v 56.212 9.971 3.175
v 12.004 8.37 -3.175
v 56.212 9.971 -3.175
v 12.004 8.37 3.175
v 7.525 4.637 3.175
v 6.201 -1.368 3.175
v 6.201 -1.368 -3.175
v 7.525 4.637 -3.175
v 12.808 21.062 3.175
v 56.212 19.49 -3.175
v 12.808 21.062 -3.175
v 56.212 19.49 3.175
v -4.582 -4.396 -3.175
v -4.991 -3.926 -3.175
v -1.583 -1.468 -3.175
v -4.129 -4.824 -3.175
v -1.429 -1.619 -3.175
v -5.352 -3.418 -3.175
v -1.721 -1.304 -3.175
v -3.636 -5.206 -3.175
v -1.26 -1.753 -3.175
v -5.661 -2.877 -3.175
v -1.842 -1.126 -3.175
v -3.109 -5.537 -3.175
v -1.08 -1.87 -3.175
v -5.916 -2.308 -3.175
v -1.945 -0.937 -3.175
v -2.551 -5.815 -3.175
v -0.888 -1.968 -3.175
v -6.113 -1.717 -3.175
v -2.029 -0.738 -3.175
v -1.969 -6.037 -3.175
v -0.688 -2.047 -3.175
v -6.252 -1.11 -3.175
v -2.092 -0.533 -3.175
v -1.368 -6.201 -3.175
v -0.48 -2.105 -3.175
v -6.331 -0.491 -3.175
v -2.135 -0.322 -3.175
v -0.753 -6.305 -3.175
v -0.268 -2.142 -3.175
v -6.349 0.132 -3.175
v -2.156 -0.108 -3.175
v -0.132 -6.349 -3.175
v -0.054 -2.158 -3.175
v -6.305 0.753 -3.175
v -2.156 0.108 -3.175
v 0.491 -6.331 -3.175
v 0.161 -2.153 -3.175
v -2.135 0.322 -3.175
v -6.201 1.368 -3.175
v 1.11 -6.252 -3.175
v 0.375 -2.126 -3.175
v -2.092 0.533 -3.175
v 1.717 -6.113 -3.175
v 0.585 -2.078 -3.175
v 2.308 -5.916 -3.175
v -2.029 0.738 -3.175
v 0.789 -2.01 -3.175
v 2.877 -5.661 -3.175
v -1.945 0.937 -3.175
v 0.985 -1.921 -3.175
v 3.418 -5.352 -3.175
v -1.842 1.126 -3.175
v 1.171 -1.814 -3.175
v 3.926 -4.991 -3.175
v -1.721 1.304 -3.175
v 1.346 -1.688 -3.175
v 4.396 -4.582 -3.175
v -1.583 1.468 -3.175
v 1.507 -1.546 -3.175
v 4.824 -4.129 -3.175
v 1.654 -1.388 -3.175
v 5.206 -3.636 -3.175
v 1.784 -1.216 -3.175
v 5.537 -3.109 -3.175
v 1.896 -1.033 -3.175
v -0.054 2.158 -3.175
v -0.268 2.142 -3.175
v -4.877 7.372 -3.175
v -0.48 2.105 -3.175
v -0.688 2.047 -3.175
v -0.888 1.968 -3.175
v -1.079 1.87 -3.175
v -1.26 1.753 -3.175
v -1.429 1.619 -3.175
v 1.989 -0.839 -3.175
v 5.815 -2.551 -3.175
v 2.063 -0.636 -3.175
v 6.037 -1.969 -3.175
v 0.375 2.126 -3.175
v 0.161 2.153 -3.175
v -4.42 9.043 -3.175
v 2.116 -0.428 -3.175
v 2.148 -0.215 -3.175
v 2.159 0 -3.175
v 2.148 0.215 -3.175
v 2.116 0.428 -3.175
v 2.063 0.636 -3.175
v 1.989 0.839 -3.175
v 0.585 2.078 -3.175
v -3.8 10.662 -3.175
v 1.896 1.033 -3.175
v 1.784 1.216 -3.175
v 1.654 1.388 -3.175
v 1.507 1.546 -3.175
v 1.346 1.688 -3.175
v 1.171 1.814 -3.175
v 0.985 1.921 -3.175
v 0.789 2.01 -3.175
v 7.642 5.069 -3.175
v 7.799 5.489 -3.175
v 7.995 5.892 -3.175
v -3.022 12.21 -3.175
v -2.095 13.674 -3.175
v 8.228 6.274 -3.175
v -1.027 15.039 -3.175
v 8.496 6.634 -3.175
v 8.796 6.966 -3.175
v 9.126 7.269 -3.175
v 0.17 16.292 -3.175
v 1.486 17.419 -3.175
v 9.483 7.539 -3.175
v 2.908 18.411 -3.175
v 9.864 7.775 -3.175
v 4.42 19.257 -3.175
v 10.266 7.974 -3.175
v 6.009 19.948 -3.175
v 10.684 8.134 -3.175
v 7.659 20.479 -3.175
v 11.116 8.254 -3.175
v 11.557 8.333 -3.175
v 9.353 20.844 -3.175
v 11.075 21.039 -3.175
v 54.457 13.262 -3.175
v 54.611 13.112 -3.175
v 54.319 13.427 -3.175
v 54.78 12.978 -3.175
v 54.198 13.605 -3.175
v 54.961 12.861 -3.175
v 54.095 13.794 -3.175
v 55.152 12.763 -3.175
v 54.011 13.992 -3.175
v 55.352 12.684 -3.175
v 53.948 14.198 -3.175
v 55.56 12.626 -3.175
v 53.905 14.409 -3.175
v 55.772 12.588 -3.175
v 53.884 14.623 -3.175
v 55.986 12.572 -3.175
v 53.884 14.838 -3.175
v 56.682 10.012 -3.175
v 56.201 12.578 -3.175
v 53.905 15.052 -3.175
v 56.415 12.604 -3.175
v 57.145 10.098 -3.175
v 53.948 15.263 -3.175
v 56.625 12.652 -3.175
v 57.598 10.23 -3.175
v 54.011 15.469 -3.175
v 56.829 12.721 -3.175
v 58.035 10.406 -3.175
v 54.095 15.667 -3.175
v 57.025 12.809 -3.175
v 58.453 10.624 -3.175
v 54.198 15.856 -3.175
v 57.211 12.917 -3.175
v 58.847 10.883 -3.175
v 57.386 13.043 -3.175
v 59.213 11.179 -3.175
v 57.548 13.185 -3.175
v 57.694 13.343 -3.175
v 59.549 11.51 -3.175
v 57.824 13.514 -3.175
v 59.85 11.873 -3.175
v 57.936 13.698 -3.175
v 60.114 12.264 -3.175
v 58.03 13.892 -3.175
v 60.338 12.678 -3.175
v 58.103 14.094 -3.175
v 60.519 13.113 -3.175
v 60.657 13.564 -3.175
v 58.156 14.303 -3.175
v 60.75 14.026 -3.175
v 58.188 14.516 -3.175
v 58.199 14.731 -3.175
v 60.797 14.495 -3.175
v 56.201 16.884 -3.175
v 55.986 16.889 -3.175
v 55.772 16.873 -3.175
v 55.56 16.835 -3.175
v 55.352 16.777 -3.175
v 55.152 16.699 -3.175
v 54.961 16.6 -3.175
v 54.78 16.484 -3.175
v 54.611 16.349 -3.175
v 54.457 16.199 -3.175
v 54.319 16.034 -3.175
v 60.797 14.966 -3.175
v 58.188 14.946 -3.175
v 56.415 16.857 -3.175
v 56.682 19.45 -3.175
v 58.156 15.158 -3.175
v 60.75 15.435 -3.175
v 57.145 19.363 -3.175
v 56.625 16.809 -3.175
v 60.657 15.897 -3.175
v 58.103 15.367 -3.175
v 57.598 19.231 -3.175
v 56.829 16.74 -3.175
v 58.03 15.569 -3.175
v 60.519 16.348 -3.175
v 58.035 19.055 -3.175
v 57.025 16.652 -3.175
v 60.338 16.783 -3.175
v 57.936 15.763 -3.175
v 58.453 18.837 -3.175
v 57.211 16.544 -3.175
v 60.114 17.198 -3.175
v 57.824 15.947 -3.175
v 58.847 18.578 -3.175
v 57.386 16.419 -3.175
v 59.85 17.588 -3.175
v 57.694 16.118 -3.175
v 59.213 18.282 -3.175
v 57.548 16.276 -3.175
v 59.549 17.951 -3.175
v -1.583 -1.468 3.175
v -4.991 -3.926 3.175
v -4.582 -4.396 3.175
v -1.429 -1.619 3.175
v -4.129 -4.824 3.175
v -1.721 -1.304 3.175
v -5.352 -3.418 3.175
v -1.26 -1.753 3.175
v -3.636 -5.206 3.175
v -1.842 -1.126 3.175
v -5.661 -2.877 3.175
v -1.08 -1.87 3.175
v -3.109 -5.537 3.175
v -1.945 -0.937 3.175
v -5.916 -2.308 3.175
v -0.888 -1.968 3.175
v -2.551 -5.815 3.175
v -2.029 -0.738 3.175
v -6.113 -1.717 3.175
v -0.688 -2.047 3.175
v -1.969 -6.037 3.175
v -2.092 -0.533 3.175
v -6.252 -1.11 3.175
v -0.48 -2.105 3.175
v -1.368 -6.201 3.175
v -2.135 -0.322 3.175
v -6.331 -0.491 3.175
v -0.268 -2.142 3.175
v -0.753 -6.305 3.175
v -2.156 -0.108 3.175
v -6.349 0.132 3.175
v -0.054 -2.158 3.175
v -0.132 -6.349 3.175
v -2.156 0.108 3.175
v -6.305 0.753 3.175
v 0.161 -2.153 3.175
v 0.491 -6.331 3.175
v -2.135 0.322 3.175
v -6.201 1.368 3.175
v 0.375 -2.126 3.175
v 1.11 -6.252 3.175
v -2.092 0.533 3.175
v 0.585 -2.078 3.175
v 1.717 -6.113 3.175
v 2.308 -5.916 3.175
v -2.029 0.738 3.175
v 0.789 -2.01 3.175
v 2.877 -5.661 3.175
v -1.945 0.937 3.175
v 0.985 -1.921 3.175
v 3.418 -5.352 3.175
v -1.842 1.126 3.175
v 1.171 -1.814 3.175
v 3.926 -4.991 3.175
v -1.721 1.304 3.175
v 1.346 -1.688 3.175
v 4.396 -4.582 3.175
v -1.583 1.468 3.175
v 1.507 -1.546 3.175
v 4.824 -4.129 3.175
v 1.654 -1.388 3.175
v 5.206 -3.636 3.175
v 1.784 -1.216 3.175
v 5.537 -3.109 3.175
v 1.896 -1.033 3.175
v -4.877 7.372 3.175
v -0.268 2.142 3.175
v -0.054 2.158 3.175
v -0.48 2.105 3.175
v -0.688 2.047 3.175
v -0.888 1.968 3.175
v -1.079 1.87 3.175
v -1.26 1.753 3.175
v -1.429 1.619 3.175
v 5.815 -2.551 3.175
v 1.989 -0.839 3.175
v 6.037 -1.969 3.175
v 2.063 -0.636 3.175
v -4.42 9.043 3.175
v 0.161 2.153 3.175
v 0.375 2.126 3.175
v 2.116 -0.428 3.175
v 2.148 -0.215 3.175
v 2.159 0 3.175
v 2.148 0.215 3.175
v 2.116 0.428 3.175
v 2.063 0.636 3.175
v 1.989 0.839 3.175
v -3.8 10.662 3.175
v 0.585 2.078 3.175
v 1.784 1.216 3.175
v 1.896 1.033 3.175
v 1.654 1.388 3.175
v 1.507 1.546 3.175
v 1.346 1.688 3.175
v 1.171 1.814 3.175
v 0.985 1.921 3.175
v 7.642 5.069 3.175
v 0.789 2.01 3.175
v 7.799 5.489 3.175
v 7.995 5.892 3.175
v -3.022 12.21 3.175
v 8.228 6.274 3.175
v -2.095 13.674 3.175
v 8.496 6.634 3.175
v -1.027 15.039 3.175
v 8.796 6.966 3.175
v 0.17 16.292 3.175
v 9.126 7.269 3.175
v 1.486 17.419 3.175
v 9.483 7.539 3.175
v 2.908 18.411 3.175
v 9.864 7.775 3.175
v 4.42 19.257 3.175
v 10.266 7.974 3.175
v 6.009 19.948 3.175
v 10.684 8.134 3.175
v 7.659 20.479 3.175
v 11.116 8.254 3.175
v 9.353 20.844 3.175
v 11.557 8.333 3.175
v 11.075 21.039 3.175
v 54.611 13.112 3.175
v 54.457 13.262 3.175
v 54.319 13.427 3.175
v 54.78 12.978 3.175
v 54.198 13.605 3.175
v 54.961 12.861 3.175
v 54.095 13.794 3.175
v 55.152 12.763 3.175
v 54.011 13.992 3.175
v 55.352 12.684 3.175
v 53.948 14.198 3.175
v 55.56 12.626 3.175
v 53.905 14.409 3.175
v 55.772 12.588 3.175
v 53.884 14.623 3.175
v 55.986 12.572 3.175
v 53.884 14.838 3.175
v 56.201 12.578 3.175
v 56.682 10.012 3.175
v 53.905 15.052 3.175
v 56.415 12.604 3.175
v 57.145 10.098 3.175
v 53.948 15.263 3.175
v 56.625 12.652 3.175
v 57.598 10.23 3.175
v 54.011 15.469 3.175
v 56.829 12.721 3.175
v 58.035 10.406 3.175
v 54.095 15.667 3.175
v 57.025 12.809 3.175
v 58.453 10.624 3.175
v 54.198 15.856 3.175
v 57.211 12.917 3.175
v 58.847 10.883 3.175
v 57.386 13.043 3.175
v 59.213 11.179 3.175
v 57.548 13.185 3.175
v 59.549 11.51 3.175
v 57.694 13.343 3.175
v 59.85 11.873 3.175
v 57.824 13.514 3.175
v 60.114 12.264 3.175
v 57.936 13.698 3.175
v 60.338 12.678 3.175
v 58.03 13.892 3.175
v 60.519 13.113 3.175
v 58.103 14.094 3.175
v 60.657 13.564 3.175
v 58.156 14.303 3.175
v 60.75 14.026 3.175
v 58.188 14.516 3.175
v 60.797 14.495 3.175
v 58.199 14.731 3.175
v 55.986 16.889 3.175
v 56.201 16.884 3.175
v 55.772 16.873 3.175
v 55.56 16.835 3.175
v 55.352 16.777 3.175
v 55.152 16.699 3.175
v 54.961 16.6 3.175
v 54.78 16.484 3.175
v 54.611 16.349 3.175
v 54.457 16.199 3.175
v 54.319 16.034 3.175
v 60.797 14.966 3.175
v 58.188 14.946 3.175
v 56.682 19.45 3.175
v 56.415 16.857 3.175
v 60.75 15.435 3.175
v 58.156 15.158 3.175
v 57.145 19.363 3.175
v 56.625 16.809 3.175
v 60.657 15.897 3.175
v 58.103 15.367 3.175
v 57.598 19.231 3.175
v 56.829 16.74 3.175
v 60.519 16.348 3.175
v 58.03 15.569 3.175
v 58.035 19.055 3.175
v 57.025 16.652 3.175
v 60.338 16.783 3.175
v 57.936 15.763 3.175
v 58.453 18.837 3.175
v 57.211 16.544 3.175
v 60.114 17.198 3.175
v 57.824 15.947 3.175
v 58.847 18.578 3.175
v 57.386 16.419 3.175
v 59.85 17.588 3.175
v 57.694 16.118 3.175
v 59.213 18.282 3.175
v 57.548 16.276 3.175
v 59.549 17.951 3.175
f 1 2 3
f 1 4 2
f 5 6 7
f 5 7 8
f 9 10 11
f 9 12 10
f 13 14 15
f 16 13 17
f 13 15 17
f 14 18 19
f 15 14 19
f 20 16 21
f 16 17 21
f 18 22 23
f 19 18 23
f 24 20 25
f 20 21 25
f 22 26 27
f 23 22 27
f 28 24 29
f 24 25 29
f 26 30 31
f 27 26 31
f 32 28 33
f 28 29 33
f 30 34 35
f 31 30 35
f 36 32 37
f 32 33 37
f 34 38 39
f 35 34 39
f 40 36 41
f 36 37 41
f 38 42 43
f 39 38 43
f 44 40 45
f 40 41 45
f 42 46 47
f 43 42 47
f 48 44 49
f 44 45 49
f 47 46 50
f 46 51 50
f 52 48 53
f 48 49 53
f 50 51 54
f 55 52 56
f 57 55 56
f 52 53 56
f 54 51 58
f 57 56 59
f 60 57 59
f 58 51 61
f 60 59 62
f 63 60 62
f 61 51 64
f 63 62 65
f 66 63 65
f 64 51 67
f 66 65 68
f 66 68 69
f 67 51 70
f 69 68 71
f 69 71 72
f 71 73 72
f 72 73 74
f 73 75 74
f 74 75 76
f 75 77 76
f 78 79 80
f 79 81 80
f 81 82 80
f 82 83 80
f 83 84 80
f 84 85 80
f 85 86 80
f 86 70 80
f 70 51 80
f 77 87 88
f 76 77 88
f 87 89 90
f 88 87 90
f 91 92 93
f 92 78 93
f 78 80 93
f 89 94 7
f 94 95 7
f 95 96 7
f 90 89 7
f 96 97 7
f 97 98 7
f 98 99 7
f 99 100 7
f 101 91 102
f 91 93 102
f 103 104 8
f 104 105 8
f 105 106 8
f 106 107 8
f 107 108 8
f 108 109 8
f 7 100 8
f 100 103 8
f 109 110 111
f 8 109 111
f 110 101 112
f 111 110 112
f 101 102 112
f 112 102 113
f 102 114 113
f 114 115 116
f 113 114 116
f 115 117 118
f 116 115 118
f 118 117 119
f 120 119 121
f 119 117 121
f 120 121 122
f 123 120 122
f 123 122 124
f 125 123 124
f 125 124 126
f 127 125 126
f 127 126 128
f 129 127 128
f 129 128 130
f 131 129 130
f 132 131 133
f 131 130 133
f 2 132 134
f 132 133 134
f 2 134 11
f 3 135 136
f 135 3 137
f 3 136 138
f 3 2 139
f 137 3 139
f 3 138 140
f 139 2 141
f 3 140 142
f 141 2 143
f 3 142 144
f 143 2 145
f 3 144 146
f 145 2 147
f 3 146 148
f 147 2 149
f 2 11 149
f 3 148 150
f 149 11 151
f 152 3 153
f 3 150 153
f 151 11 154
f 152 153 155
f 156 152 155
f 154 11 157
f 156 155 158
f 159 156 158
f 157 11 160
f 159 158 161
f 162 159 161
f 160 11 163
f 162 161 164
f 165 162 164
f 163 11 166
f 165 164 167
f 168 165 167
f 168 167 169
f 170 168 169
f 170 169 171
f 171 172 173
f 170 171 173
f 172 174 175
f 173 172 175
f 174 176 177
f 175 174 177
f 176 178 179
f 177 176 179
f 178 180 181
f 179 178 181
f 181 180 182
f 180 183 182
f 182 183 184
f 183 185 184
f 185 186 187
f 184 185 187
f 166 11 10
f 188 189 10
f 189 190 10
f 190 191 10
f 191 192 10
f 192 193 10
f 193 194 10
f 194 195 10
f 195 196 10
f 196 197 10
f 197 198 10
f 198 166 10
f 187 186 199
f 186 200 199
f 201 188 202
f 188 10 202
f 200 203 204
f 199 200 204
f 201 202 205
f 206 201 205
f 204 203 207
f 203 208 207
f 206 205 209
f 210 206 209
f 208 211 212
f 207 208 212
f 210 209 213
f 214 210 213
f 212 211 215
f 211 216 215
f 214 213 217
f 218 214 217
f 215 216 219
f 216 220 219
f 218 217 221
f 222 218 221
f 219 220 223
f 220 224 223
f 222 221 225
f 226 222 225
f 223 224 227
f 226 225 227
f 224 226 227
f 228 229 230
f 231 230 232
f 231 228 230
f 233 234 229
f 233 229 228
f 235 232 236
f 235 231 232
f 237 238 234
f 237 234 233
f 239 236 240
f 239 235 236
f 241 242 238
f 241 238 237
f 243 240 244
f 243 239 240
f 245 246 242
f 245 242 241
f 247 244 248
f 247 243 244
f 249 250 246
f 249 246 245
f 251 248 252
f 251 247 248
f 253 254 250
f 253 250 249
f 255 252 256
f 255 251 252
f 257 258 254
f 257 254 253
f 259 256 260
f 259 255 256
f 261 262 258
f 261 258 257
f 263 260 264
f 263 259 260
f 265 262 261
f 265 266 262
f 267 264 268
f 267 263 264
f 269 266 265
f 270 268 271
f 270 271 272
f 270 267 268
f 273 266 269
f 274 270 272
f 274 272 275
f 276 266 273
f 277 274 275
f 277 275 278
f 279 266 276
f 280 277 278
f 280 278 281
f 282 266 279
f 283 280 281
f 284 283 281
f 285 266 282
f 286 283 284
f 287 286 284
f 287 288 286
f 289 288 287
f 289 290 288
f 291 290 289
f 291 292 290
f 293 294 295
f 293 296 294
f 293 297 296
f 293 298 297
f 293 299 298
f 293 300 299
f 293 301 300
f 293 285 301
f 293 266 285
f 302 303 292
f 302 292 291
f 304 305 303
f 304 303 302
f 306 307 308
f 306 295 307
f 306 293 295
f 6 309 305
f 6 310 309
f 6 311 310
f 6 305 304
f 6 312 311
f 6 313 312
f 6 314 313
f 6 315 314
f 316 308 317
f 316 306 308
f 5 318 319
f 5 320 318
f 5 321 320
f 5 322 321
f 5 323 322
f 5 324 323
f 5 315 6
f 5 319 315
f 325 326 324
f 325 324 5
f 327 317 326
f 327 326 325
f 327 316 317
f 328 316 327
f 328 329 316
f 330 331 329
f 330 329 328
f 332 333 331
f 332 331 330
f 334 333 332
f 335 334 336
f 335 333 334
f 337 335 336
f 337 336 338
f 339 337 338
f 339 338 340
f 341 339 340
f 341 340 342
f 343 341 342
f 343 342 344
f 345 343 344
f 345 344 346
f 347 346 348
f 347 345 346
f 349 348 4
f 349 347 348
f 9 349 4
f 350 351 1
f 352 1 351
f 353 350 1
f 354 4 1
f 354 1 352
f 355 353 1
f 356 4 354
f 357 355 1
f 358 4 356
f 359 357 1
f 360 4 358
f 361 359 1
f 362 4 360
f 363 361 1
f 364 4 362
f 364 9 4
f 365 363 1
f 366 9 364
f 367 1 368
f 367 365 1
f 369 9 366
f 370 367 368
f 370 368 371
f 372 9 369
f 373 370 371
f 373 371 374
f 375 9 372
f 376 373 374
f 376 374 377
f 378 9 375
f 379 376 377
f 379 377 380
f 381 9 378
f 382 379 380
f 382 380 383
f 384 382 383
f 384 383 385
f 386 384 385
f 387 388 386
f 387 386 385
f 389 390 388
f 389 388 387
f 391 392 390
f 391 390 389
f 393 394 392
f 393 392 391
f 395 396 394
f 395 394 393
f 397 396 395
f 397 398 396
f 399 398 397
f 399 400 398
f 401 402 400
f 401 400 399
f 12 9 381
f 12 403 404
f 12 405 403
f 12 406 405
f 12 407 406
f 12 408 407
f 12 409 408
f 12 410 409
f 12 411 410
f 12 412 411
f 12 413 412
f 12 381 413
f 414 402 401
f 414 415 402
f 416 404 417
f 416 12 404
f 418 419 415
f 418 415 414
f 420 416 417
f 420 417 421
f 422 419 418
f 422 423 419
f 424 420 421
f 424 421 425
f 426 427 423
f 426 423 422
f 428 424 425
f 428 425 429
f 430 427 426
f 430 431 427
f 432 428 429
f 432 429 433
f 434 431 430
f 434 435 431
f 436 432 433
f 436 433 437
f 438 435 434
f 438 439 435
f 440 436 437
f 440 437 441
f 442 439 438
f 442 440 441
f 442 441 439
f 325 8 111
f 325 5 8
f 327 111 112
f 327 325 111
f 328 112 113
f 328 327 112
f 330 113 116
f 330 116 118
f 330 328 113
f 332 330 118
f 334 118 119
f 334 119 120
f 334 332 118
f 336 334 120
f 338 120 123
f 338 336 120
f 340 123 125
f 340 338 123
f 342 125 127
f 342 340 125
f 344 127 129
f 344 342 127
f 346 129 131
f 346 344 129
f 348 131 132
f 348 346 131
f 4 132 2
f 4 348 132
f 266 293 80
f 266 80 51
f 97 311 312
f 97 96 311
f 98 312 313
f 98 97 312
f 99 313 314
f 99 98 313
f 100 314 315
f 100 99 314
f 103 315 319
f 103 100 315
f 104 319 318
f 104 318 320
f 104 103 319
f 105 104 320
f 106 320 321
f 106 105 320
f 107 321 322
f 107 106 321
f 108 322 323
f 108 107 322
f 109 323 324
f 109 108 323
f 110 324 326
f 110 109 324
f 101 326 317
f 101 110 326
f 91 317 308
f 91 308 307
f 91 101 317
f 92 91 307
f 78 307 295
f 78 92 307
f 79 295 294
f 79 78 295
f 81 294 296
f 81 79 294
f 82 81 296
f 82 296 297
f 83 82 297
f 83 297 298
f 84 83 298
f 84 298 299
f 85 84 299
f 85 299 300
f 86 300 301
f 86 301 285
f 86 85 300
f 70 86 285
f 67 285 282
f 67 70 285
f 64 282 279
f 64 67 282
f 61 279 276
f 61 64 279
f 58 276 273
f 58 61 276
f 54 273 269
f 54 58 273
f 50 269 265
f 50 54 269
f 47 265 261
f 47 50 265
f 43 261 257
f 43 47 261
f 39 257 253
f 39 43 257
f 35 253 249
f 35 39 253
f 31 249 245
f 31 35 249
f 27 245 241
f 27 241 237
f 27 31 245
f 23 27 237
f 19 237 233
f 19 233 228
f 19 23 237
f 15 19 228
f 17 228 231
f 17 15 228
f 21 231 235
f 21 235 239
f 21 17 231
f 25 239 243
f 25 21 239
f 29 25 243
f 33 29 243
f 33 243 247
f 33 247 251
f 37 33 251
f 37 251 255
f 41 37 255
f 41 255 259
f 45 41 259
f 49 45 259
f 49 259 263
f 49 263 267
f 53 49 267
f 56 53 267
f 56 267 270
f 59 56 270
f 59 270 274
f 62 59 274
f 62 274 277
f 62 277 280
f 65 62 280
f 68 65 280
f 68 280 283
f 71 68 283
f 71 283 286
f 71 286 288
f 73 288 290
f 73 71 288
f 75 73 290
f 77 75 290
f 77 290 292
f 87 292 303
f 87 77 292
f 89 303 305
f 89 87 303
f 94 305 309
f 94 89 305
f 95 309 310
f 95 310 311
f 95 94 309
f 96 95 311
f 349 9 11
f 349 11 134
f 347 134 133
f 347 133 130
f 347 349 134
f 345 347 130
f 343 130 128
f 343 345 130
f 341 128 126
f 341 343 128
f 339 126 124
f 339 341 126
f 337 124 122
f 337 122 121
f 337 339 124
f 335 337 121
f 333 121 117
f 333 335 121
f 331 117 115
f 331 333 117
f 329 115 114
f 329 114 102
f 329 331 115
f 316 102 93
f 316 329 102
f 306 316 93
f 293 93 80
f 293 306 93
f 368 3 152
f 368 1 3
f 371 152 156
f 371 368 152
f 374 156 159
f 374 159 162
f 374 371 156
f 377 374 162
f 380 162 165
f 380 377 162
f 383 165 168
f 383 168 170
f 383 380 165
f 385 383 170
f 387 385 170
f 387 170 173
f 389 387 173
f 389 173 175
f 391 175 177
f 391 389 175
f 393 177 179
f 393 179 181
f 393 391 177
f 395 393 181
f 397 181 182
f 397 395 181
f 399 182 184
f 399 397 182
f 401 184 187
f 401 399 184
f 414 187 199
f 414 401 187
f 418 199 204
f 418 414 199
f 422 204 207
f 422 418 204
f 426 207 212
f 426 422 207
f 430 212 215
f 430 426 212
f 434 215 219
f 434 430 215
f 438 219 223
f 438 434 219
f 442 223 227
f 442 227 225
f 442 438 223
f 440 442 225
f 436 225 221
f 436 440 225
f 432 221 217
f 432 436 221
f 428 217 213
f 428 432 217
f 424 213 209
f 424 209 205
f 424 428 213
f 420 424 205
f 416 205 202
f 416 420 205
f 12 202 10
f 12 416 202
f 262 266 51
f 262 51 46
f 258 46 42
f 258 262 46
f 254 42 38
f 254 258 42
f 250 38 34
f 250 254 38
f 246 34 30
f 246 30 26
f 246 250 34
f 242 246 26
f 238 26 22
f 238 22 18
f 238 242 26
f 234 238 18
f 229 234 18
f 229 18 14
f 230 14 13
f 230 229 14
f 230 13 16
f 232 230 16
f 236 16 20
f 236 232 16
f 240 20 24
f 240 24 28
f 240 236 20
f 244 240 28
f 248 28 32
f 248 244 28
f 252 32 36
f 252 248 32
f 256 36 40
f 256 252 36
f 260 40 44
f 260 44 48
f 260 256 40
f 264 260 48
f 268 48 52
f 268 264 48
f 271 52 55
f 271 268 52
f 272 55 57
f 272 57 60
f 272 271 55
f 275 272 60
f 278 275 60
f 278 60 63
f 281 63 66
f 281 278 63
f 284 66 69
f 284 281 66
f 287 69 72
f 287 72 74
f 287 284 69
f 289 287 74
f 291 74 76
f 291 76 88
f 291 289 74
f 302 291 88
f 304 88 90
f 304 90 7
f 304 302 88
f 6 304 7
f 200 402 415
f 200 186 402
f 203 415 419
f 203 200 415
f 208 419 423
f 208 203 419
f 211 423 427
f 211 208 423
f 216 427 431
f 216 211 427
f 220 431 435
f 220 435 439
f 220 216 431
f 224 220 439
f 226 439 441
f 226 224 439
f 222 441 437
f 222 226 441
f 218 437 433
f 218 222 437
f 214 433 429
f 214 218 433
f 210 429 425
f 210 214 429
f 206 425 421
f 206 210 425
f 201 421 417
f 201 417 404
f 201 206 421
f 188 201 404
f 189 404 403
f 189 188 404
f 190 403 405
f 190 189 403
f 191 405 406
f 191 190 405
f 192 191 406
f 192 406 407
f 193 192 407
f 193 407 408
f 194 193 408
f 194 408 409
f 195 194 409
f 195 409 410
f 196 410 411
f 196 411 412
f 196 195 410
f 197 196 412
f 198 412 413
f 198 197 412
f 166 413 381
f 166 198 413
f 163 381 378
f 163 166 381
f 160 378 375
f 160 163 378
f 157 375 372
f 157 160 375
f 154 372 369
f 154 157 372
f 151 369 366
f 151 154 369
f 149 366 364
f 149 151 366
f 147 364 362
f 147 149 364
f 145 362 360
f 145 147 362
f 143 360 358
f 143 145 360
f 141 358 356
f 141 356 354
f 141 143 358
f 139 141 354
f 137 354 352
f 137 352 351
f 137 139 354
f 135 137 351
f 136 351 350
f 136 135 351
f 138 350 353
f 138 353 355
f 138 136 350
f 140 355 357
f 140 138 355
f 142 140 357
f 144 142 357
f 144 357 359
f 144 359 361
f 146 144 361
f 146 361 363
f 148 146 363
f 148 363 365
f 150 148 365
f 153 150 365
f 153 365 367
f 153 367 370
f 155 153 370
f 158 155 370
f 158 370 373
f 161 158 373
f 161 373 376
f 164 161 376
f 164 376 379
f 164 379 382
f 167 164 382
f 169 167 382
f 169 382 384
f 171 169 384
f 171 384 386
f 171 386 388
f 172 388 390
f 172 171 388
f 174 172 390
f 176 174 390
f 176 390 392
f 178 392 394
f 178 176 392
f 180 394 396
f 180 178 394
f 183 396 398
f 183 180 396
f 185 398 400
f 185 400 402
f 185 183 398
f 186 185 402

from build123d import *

# Parameters (mm, degrees)
SKETCH1_R           = 2.159
BOSS_EXTRUDE1_DEPTH = 3.175


with BuildPart() as part:
    # Sketch1 → Boss-Extrude1 (new, symmetric)
    with BuildSketch(Plane.XY):
        with BuildLine():
            Line((56.212406906, 19.490008209), (12.807859934, 21.061903429))
            ThreePointArc((12.807859934, 21.061903429), (1.486348152, 17.419283948), (-4.876850173, 7.371646773))
            Line((-4.876850173, 7.371646773), (-6.200989145, 1.36756485))
            ThreePointArc((-6.200989145, 1.36756485), (-1.36756485, -6.200989145), (6.200989145, -1.36756485))
            Line((6.200989145, -1.36756485), (7.525128118, 4.636517072))
            ThreePointArc((7.525128118, 4.636517072), (9.126161655, 7.268805354), (12.003509079, 8.370223433))
            Line((12.003509079, 8.370223433), (56.212406906, 9.971248211))
            ThreePointArc((56.212406906, 9.971248211), (60.802546008, 14.73062821), (56.212406906, 19.490008209))
        make_face()
        Circle(SKETCH1_R, mode=Mode.SUBTRACT)
        with Locations((56.040046008, 14.73062821)):
            Circle(SKETCH1_R, mode=Mode.SUBTRACT)
    extrude(amount=BOSS_EXTRUDE1_DEPTH, both=True)


solid = part.part
